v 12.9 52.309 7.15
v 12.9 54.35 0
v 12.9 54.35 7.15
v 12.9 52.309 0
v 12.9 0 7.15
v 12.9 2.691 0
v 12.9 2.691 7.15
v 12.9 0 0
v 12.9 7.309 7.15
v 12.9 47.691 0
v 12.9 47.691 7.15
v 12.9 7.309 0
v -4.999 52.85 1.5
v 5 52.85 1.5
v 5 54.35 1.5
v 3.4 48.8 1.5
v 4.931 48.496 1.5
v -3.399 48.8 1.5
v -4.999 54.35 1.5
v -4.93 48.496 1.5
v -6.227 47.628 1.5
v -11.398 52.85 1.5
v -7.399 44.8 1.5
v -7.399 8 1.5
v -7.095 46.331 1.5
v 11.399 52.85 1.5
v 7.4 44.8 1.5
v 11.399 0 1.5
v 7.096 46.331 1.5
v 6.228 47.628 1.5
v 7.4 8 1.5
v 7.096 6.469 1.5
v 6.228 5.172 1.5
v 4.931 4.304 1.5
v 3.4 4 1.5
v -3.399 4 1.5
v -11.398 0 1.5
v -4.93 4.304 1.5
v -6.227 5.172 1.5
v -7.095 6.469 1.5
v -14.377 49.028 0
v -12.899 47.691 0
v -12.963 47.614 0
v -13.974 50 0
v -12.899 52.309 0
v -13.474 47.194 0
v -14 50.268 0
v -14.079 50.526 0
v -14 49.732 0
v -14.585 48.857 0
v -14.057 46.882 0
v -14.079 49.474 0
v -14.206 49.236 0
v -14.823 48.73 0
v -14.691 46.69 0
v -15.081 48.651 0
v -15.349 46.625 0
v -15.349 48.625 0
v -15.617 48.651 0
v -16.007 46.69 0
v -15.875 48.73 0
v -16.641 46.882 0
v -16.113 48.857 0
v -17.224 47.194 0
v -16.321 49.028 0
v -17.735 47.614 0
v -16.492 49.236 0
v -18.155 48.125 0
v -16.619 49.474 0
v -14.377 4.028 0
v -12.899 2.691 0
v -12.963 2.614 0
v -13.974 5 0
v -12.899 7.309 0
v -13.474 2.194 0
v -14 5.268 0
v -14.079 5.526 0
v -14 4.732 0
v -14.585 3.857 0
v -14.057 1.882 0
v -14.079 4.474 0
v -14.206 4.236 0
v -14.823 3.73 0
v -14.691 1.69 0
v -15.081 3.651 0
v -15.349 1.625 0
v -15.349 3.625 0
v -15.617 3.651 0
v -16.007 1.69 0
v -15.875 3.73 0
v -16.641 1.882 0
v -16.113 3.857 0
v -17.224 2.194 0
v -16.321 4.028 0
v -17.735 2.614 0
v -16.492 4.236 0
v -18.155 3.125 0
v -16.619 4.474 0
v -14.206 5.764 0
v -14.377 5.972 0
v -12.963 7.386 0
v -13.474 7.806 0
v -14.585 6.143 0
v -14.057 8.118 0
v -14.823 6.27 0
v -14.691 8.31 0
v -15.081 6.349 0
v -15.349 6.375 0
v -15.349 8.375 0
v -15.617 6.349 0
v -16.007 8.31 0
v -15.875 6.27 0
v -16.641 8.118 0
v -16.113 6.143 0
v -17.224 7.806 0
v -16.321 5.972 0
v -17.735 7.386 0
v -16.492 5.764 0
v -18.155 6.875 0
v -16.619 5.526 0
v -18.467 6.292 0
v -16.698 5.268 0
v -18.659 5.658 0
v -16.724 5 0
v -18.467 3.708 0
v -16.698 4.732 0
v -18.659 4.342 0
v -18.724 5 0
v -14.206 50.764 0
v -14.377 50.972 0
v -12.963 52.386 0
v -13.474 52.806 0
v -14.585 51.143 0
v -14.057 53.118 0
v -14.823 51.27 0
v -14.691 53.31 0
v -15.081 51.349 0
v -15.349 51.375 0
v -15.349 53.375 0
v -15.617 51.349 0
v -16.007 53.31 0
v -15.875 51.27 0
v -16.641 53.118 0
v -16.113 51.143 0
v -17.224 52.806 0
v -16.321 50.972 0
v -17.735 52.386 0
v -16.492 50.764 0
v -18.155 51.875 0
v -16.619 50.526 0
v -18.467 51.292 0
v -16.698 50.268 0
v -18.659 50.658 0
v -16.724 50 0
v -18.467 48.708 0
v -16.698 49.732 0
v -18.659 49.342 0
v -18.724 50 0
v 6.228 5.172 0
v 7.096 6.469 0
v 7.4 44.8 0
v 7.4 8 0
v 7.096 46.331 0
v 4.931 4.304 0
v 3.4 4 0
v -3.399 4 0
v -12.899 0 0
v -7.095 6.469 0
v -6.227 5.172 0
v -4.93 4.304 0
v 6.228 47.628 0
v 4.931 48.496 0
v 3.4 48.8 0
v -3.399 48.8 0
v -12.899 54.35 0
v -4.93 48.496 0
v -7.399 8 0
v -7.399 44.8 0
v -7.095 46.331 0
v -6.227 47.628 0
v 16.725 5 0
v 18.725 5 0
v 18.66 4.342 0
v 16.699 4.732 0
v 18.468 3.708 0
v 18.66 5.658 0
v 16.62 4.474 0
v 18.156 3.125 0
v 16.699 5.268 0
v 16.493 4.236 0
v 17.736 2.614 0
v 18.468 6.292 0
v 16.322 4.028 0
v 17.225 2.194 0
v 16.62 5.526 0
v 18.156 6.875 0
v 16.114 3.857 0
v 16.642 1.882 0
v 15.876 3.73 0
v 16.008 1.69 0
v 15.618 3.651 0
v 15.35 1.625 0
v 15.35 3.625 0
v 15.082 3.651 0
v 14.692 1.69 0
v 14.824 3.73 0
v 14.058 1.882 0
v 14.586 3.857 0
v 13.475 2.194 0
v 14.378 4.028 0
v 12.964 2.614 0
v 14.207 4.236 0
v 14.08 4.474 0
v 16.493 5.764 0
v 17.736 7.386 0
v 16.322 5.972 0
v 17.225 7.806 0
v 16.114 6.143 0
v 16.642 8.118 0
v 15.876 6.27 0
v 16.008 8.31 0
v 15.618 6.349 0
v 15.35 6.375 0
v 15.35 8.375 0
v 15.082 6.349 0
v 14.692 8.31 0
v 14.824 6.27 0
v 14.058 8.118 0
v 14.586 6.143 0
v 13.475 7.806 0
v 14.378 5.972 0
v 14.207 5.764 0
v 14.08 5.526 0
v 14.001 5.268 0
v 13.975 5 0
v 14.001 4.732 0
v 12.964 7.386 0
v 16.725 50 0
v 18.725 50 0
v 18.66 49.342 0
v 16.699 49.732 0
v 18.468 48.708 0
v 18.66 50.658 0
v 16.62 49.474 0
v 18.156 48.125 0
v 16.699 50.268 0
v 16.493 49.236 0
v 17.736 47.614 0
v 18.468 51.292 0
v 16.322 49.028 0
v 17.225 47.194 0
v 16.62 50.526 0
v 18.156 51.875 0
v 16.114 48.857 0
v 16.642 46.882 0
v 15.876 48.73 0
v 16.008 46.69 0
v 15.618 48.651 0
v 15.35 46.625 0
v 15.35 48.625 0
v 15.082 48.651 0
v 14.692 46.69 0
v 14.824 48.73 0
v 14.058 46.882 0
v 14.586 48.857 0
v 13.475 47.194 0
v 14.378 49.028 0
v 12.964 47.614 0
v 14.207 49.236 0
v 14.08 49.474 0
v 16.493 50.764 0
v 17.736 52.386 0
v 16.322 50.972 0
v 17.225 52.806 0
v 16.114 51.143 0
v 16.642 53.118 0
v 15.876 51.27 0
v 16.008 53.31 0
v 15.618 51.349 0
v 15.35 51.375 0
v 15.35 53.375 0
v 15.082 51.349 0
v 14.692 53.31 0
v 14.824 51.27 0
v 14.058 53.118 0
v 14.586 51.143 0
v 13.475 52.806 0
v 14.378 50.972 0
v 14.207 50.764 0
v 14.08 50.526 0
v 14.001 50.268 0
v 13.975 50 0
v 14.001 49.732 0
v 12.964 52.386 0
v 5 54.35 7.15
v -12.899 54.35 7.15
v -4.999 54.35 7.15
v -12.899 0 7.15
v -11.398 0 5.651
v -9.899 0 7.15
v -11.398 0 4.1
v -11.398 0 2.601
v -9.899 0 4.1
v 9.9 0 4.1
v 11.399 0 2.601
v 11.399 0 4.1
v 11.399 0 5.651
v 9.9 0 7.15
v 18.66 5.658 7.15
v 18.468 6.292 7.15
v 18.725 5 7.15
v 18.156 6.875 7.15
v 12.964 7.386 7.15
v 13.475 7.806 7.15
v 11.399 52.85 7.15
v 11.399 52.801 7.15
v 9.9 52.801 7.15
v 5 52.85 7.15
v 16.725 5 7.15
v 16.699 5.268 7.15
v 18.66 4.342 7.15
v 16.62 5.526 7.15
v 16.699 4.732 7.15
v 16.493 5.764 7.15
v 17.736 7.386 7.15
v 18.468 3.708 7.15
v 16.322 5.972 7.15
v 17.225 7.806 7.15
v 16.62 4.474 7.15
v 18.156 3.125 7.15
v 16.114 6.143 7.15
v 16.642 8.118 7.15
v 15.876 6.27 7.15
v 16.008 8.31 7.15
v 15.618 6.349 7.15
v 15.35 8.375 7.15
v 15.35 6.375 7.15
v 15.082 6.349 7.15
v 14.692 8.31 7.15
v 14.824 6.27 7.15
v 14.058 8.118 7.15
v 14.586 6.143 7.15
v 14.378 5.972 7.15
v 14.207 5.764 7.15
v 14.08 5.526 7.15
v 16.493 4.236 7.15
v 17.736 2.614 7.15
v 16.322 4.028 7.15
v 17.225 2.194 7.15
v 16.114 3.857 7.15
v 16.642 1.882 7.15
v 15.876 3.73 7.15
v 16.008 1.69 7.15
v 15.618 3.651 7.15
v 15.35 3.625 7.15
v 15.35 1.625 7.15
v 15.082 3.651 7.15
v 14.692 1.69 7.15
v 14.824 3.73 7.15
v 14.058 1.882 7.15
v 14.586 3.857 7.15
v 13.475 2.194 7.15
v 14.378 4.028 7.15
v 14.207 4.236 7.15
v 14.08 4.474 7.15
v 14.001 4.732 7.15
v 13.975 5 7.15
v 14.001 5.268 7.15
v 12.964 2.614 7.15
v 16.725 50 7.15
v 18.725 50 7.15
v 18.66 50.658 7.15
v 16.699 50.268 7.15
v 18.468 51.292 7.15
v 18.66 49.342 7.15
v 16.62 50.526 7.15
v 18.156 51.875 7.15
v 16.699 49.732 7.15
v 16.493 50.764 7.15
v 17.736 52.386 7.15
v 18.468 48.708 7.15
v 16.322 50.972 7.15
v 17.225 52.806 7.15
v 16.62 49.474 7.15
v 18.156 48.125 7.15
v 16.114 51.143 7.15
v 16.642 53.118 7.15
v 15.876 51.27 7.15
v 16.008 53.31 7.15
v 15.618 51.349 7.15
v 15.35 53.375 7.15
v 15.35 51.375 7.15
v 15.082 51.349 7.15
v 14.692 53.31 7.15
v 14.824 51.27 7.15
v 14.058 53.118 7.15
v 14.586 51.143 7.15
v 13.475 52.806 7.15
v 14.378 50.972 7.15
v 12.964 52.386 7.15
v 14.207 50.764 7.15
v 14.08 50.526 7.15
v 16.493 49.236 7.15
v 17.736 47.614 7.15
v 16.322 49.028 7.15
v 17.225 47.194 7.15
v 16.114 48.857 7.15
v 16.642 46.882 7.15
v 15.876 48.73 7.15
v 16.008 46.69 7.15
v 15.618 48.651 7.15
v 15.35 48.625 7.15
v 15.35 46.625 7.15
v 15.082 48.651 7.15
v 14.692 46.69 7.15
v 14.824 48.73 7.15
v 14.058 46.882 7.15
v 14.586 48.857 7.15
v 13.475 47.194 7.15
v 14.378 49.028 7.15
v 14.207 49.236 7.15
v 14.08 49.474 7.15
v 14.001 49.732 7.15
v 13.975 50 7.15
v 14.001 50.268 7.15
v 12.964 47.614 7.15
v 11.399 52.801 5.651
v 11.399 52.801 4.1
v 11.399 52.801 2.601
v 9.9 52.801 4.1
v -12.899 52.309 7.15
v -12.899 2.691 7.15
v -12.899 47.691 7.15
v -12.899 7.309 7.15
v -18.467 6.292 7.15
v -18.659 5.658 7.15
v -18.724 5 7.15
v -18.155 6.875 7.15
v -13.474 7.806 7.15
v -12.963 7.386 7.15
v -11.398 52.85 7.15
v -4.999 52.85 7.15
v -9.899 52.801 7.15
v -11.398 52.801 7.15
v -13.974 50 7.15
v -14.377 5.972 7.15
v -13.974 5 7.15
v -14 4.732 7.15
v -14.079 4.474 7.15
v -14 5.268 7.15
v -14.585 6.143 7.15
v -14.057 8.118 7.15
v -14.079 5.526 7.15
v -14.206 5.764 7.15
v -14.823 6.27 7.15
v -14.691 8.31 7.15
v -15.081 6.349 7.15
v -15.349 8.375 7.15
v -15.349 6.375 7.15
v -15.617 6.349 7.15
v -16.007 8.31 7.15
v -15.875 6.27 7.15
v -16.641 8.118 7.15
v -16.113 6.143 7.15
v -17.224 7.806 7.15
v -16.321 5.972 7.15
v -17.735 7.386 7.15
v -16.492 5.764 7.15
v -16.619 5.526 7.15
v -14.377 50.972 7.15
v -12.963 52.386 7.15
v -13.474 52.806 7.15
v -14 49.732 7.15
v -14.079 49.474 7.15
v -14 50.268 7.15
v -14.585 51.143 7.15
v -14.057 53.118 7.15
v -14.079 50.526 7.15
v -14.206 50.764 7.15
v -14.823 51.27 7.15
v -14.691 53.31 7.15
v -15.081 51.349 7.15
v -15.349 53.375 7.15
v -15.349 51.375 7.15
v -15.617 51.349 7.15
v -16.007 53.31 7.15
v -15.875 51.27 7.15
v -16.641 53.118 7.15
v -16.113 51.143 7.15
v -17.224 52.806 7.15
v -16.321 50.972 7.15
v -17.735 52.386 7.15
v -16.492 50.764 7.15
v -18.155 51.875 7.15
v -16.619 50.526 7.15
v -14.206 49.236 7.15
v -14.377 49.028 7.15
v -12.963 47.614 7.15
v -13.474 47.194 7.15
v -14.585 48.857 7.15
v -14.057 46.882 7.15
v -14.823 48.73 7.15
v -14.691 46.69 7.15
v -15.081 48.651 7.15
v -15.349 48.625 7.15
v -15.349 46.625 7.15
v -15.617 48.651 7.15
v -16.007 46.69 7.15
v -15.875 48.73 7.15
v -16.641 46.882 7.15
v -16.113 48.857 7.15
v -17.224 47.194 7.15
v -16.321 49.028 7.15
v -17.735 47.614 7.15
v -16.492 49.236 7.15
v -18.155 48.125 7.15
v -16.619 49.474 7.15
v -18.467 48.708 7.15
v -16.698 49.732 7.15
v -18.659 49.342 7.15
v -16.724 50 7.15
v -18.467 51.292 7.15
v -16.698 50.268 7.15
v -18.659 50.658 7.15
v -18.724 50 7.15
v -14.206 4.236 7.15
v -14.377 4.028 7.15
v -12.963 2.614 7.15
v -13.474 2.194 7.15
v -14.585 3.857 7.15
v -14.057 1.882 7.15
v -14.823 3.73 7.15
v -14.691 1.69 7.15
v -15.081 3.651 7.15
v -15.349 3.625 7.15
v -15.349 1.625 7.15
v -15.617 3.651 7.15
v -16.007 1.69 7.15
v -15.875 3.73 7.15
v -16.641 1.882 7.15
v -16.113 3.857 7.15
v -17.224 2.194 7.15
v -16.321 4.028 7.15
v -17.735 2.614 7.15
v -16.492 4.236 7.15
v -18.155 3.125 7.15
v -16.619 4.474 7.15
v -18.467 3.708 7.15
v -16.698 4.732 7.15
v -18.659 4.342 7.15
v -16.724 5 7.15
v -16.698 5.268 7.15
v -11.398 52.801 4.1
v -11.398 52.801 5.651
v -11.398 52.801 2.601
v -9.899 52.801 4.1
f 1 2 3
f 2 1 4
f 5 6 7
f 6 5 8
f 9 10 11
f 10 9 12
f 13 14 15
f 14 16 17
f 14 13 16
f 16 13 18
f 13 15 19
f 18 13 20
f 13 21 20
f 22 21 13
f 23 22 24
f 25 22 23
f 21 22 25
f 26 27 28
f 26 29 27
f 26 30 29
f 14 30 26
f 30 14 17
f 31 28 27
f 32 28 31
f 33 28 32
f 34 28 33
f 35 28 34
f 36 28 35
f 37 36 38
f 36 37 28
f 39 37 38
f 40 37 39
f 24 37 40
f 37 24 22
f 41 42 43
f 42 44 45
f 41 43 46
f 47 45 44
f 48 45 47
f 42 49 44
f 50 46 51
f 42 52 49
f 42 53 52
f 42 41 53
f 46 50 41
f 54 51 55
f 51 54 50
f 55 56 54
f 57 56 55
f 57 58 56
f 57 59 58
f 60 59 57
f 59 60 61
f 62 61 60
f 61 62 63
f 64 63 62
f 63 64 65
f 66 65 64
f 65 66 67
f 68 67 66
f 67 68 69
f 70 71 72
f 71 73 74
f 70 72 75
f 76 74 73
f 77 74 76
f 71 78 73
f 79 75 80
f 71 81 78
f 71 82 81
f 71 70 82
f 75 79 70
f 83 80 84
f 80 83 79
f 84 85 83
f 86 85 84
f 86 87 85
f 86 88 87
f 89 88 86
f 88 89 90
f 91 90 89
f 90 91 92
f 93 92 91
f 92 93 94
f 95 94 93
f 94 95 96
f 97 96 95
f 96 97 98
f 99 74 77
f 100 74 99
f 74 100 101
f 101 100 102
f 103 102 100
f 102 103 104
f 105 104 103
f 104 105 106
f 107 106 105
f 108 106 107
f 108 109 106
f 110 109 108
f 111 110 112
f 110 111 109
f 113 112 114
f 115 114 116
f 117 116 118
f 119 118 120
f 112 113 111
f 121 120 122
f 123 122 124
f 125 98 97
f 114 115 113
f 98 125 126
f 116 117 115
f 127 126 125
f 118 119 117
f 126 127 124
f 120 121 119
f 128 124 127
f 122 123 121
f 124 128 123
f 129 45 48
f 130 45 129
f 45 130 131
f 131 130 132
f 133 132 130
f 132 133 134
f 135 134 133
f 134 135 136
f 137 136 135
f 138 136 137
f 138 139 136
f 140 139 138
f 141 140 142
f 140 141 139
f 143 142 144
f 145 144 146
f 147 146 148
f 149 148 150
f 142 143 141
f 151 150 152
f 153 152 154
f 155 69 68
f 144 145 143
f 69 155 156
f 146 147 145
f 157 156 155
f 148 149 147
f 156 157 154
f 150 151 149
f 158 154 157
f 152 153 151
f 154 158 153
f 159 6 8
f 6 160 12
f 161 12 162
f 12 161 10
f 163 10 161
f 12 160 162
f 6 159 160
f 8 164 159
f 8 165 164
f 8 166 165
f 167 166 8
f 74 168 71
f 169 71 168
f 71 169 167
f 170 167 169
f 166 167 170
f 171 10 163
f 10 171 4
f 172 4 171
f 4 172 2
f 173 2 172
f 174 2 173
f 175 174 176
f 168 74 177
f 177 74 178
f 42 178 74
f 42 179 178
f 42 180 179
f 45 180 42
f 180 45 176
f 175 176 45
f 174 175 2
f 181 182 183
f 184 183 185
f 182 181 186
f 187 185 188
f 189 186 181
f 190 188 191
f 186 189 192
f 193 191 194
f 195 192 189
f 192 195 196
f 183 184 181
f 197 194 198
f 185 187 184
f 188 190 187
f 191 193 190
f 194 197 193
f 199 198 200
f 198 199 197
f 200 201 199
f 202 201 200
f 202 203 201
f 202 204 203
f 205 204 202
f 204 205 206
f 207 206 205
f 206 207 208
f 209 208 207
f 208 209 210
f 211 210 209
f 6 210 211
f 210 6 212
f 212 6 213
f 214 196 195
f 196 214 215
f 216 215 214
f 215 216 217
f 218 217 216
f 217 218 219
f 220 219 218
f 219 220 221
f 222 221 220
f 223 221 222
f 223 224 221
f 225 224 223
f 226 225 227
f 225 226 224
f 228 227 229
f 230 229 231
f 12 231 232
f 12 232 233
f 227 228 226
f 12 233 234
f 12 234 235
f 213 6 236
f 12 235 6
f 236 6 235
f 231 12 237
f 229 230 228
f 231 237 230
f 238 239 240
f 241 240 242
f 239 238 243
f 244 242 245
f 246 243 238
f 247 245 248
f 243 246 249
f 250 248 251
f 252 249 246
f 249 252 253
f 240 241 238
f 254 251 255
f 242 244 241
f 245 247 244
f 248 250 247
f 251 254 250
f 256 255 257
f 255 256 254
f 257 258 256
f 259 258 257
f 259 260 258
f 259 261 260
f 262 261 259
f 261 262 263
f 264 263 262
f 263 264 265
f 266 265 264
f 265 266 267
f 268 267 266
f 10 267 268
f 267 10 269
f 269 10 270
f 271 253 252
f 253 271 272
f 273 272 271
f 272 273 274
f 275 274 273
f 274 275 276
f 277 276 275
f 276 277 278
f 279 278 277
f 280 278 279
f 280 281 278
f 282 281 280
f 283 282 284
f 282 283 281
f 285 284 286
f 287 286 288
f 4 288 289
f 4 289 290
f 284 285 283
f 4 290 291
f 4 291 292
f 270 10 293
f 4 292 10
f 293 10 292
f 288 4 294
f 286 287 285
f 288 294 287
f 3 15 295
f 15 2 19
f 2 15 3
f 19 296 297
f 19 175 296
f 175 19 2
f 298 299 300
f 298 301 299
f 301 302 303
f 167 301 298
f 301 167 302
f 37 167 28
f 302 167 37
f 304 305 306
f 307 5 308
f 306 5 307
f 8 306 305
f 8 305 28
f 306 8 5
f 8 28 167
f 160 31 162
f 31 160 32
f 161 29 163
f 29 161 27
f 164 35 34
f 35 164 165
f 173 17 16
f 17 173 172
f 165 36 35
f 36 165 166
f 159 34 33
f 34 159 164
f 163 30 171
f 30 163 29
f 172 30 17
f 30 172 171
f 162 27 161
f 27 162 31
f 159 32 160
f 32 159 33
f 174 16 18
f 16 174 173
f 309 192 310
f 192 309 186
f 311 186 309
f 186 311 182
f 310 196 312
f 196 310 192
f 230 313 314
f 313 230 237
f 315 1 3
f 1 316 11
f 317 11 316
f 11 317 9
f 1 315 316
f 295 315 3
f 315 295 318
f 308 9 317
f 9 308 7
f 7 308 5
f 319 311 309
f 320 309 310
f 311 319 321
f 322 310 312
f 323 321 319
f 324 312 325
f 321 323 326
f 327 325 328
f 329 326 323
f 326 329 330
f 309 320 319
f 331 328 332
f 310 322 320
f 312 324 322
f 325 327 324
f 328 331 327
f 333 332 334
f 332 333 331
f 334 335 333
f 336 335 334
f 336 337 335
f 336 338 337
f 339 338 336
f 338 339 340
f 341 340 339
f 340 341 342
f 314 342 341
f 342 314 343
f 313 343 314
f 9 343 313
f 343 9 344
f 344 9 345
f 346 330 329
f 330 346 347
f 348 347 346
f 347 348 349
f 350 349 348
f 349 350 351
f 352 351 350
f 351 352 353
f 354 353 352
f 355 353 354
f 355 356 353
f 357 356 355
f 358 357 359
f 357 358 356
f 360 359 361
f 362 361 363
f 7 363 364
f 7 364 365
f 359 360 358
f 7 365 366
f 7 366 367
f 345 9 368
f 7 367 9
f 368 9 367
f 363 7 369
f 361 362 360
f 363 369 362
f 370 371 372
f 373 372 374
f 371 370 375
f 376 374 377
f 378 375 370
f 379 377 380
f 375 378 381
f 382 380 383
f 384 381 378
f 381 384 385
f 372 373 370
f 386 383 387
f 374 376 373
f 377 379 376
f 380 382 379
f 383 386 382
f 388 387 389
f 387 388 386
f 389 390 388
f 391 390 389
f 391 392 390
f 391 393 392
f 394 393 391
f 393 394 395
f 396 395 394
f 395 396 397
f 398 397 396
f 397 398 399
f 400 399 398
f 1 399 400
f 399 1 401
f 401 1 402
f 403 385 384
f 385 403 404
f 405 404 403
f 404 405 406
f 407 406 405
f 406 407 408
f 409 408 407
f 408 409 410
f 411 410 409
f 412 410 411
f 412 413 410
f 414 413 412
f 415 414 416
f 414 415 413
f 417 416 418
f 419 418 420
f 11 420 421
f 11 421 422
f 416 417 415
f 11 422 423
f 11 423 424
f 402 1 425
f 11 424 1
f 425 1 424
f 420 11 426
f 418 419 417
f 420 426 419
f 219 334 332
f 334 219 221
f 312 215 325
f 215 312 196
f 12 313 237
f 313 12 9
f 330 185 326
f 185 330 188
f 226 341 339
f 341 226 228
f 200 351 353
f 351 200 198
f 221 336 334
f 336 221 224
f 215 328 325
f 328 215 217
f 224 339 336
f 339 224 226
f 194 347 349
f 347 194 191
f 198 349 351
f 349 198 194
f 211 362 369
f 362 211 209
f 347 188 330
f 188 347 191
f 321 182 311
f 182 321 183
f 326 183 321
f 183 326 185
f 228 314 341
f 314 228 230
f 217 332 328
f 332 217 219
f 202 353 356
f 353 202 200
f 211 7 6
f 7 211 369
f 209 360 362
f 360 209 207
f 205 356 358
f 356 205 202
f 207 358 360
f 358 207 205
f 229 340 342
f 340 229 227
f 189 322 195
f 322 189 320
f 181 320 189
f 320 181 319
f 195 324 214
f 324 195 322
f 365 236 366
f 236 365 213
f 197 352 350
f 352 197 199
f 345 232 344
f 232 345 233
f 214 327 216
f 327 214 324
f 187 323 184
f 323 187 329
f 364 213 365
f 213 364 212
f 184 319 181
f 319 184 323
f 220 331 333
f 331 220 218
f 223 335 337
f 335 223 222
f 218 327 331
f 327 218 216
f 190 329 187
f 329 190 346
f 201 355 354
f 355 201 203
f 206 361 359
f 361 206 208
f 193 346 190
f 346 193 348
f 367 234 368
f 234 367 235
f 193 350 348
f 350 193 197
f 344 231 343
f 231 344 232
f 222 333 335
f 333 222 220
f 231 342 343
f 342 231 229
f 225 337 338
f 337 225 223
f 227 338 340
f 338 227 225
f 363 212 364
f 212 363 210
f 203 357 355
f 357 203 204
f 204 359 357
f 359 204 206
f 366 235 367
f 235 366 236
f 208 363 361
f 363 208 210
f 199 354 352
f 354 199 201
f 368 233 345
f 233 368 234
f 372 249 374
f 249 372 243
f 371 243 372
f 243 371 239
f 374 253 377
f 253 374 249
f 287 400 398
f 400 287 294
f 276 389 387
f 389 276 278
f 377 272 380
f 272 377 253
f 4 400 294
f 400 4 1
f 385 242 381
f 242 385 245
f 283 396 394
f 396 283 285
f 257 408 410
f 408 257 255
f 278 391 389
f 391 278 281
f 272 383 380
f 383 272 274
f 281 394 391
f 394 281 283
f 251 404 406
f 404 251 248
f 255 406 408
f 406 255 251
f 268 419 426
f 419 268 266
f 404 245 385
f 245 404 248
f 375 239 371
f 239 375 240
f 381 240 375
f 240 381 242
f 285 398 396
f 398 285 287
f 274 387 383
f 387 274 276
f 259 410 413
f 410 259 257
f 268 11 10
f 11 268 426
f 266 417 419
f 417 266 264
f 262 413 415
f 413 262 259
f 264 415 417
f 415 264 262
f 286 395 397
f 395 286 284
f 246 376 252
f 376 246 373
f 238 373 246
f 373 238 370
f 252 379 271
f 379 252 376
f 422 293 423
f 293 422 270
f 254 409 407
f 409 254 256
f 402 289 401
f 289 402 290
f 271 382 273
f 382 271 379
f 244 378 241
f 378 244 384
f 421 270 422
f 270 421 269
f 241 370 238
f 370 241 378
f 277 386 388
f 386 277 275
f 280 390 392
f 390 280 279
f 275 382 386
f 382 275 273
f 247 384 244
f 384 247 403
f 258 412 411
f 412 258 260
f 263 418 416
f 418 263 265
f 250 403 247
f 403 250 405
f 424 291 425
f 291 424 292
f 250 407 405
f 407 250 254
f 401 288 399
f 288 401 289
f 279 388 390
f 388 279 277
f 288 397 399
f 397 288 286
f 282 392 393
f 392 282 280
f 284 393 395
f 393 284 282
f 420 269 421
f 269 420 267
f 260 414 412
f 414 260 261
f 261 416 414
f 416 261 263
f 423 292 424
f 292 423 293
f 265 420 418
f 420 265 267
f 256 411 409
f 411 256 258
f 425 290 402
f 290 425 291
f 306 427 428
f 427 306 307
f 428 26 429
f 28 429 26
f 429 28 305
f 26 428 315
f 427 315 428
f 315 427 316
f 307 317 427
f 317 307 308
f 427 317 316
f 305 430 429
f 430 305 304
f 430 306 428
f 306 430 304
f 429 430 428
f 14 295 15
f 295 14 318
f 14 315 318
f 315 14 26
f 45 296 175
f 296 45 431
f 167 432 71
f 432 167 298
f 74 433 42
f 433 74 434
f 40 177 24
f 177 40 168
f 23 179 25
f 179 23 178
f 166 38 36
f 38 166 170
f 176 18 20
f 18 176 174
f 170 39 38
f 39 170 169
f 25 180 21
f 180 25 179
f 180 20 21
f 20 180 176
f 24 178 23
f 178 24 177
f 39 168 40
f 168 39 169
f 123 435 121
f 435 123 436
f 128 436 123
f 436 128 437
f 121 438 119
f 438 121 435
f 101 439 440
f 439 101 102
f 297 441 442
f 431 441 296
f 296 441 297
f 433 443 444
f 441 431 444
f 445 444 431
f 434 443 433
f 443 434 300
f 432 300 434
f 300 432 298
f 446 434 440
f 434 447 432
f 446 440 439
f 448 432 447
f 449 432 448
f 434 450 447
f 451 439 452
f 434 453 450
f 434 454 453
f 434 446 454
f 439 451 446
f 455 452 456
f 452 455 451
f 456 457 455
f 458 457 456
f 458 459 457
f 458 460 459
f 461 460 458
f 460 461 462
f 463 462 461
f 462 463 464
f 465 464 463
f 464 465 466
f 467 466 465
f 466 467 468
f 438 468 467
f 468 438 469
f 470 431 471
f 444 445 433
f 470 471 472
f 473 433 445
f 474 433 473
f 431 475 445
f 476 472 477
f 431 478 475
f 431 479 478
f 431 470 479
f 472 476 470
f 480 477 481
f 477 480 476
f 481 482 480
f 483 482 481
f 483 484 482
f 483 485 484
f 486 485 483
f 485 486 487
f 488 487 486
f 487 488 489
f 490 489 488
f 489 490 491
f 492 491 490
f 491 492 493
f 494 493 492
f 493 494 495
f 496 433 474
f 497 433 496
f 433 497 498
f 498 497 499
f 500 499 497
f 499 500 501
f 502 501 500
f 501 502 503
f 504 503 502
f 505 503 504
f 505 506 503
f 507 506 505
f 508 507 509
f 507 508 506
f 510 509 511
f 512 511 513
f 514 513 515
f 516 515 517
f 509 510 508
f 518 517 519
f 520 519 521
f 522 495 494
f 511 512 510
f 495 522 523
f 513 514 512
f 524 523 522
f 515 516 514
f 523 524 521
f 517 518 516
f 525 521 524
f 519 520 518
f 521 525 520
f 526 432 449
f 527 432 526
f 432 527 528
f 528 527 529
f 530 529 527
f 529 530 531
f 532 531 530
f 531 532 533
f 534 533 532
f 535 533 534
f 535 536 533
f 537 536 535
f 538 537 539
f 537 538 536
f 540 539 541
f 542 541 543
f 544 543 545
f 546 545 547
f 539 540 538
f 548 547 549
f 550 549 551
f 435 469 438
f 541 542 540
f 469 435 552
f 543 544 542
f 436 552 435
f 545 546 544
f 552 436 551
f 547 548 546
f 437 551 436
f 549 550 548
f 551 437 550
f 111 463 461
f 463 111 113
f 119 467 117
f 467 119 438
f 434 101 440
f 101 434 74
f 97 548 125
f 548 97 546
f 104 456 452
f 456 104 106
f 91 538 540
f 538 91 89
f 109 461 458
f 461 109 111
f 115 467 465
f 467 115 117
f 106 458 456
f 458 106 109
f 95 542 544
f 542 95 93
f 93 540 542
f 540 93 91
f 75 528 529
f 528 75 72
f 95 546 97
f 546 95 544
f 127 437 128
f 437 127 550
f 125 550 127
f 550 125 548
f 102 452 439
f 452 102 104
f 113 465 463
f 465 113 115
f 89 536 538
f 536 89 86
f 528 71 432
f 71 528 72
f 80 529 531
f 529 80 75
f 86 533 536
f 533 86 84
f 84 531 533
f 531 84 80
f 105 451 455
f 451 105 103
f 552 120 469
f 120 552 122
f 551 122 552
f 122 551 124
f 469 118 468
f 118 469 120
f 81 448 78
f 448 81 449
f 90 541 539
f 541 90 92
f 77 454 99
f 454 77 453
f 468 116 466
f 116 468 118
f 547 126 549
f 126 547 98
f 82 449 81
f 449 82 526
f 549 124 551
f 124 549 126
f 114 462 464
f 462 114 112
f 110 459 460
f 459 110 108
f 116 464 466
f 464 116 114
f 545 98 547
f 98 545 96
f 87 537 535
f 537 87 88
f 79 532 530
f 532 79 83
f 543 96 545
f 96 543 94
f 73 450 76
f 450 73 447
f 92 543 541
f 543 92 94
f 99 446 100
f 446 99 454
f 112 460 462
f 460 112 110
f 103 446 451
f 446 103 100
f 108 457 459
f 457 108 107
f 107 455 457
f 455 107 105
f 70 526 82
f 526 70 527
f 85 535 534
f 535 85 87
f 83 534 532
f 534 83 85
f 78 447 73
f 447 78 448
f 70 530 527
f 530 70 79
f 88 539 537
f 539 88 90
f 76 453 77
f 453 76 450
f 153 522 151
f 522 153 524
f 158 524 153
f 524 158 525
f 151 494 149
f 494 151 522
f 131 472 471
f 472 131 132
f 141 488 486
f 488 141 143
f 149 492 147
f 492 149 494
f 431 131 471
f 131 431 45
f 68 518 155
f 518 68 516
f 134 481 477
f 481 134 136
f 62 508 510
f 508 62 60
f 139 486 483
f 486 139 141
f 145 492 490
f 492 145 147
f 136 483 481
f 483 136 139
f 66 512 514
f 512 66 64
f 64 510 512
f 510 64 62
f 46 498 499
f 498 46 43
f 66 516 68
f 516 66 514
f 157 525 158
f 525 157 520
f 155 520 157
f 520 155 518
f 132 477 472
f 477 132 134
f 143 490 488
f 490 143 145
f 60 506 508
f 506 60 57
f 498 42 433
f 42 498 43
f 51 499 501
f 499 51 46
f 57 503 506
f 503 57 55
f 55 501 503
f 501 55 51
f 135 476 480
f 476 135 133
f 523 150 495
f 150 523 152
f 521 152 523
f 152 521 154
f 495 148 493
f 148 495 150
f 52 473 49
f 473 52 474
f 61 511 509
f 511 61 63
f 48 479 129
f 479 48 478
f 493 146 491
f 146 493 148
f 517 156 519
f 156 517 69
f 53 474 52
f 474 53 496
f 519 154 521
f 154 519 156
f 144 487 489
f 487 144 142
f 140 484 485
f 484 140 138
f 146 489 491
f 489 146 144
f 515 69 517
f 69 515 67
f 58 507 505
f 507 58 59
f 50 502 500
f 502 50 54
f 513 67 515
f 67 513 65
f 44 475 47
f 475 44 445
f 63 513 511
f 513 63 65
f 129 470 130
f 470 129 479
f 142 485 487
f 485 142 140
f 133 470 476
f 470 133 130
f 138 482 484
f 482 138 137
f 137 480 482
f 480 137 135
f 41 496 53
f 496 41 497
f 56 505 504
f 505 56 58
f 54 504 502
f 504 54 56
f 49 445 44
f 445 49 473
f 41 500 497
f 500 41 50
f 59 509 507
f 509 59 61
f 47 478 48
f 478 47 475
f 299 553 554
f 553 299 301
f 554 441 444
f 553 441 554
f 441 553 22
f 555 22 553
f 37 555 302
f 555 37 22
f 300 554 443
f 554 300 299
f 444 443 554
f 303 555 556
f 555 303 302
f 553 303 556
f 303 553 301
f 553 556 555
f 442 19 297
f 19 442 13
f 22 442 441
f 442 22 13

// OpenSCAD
// This file was processed by resolve-include.py [https://github.com/arpruss/miscellaneous-scad/blob/master/scripts/resolve-include.py] 
// to include  all the dependencies inside one file.


//BEGIN DEPENDENCY: use <pointhull.scad>;
function _slice(list,start,end=undef) =
    let(end = end==undef?len(list):end)
    [for(i=[start:1:end-1]) list[i]];

function _delete(list,pos) =
    let(l=len(list))
    pos == 0 ? [for(i=[1:1:l-1]) list[i]] :
    pos >= l-1 ? [for(i=[0:1:pos-1]) list[i]] :
    concat([for(i=[0:1:pos-1]) list[i]],
        [for(i=[pos+1:1:l-1]) list[i]]);

function _areCollinear(a,b,c) = cross(b-a,c-a) == [0,0,0];

function _areCoplanar(a,b,c,d) = (d-a)*cross(b-a,c-a) == 0;

function _findNoncollinear(list,point1,point2,pos=0) =
    pos >= len(list) ? undef :
    ! _areCollinear(point1,point2,list[pos]) ? pos :
    _findNoncollinear(list,point1,point2,pos=pos+1);

function _findNoncoplanar(list,point1,point2,point3,pos=0) =
   pos >= len(list) ? undef :
   ! _areCoplanar(point1,point2,point3,list[pos]) ? pos :
        _findNoncoplanar(list,point1,point2,point3,pos=pos+1);

function _isBoundedBy(a,face,strict=false) =
    cross(face[1]-face[0],face[2]-face[0])*(a-face[0]);

function _makeTet(a,b,c,d) =
    _isBoundedBy(d,[a,b,c]) >= 0 ?
        [[a,b,c],[b,a,d],[c,b,d],[a,c,d]] :
        [[c,b,a],[d,a,b],[d,b,c],[d,c,a]];

function _findTri(list) =
    let(l2=_unique(list))
    assert(len(l2)>=3)
    let(a=l2[0],
        b=l2[1],
        l3=_slice(l2,2),
        ci=_findNoncollinear(l3,a,b),
        c=assert(ci != undef) l3[ci],
        l4=_delete(l3,ci))
        [[a,b,c],l4];

function _findTet(list) =
    let(ft=_findTri(list),
        tri=ft[0],
        l4=ft[1],
        di=assert(len(l4)>0) _findNoncoplanar(l4,tri[0],tri[1],tri[2]),
        d=assert(di != undef) l4[di],
        l5=_delete(l4,di))
        [_makeTet(tri[0],tri[1],tri[2],d),l5];

function _find(list,value) =
    let(m=search([value],list,1)[0])
    m==[] ? undef : m;

function _unique(list,soFar=[],pos=0) =
    pos >= len(list) ? soFar :
    _find(soFar,list[pos]) == undef ? _unique(list,soFar=concat(soFar,[list[pos]]),pos=pos+1) :
    _unique(list,soFar=soFar,pos=pos+1);

function _makePointsAndFaces(triangles) =
    let(points=_unique([for(t=triangles) for(v=t) v]))
        [points, [for(t=triangles) [for(v=t) _find(points,v)]]];

function _sameSide(p1,p2, a,b) =
    let(cp1 = cross(b-a, p1-a),
        cp2 = cross(b-a, p2-a))
        cp1*cp2 >= 0;

function _insideTriangle(p, t) =
    _sameSide(p,t[0],t[1],t[2]) &&
    _sameSide(p,t[1],t[0],t[2]) &&
    _sameSide(p,t[2],t[0],t[1]);


function _satisfiesConstraint(p, triangle) =
    let(c=_isBoundedBy(p, triangle))
    c > 0 || (c == 0 && _insideTriangle(p, triangle));


function _insidePoly(p, triangles, pos=0) =
    pos >= len(triangles) ? true :
    !_satisfiesConstraint(p, triangles[pos]) ? false :
    _insidePoly(p, triangles, pos=pos+1);

function _outerEdges(triangles) =
        let(edges=[for(t=triangles) for(e=[[t[0],t[1]],
                [t[1],t[2]],
                [t[2],t[0]]]) e])
        [for(e=edges) if(undef == _find(edges,[e[1],e[0]])) e];

function _unlit(triangles, p) = [for(t=triangles) if(_isBoundedBy(p, t) >= 0) t];

function _addToHull(h, p) =
    let(unlit = _unlit(h,p),
        edges = _outerEdges(unlit))
        concat(unlit, [for(e=edges) [e[1],e[0],p]]);

function _expandHull(h, points, pos=0) =
    pos >= len(points) ? h :
    !_insidePoly(points[pos],h) ?  _expandHull(_addToHull(h,points[pos]),points,pos=pos+1) :
    _expandHull(h, points, pos=pos+1);

function pointHull3D(points) =
    let(ft=_findTet(points))
        _expandHull(ft[0], ft[1]);

function _traceEdges(edgeStarts,edgeEnds,soFar=undef) =
    soFar==undef ? _traceEdges(edgeStarts,edgeEnds,[edgeStarts[0]]) :
    assert(soFar[len(soFar)-1] != undef)
    len(soFar)>1 && soFar[len(soFar)-1] == soFar[0] ? _slice(soFar,1) :
    _traceEdges(edgeStarts,edgeEnds,soFar=concat(soFar,[edgeEnds[_find(edgeStarts,soFar[len(soFar)-1])]]));

function _project(v) = [v[0],v[1]];

function pointHull2D(points) =
    let(
        p3d = concat([[0,0,1]],
            [for(p=points) [p[0],p[1],0]]),
        h = pointHull3D(p3d),
        edgeStarts = [for(t=h) if(t[0][2]==1 || t[1][2]==1 || t[2][2]==1)
                t[0][2]==1 ? _project(t[1]) :
                t[1][2]==1 ? _project(t[2]) :
                _project(t[0]) ],
        edgeEnds = [for(t=h) if(t[0][2]==1 || t[1][2]==1 || t[2][2]==1)
                t[0][2]==1 ? _project(t[2]) :
                t[1][2]==1 ? _project(t[0]) :
                _project(t[1]) ])
        _traceEdges(edgeStarts,edgeEnds,soFar=[edgeStarts[0]]);

function pointHull(points) =
    len(points[0]) == 2 ? pointHull2D(points) :
        pointHull3D(points);

module pointHull(points) {
    if (len(points[0])==2) {
        polygon(pointHull2D(points));
    }
    else {
        paf = _makePointsAndFaces(pointHull3D(points));
        polyhedron(points=paf[0],faces=paf[1]);
    }
}

function extractPointsFromHull(h) =
    _unique(
        is_num(h[0][0]) ? h : [for(t=h) for(v=t) v] );

function _d22(a00,a01,a10,a11) = a00*a11-a01*a10;

function _determinant3x3(m) = m[0][0]*_d22(m[1][1],m[1][2],m[2][1],m[2][2])
    -m[0][1]*_d22(m[1][0],m[1][2],m[2][0],m[2][2])
    +m[0][2]*_d22(m[1][0],m[1][1],m[2][0],m[2][1]);

function _determinant2x2(m) = _d22(m[0][0],m[0][1],m[1][0],m[1][1]);

// Cramer's rule
// n.b. Determinant of matrix is the same as of its transpose
function _solve3(a,b,c) =
    let(det=_determinant3x3([a[0],b[0],c[0]]))
    det == 0 ? undef :
    let(rhs=[a[1],b[1],c[1]],
        col0=[a[0][0],b[0][0],c[0][0]],
        col1=[a[0][1],b[0][1],c[0][1]],
        col2=[a[0][2],b[0][2],c[0][2]])
    [_determinant3x3([rhs,col1,col2]),
    _determinant3x3([col0,rhs,col2]),
    _determinant3x3([col0,col1,rhs])]/det;

function _solve2(a,b) =
    let(det=_determinant2x2([a[0],b[0]]))
    det == 0 ? undef :
    let(rhs=[a[1],b[1]],
        col0=[a[0][0],b[0][0]],
        col1=[a[0][1],b[0][1]])
    [_determinant2x2([rhs,col1]),
    _determinant2x2([col0,rhs])]/det;

function _satisfies(p,constraint) =
    p*constraint[0] <= constraint[1];

function _linearConstraintExtrema(constraints,constraintsMarked=false) =
        let(c=_unique(constraints),
            n=len(c))
        len(c[0][0]) == 3 ?
        [
        for(i=[0:1:n-1]) for(j=[i+1:1:n-1]) for(k=[j+1:1:n-1]) let(p=_solve3(c[i],c[j],c[k])) if(p!=undef && _satisfiesAll(p,c,except1=i,except2=j,except3=k)) constraintsMarked?[p,[i,j,k]]:p
        ] :
        [
        for(i=[0:1:n-1]) for(j=[i+1:1:n-1]) let(p=_solve2(c[i],c[j])) if(p!=undef && _satisfiesAll(p,c,except1=i,except2=j)) constraintsMarked?[p,[i,j,-1]]:p
        ];

function _satisfiesAll(p,c,except1=undef,except2=undef,except3=undef,pos=0) =
        pos >= len(c) ? true :
        except1 == pos || except2 == pos || except3 == pos || _satisfies(p,c[pos]) ? _satisfiesAll(p,c,except1,except2,except3,pos=pos+1) :
        false;


module linearConstraintShape(constraints) {
    pointHull(_linearConstraintExtrema(constraints));
}

// 3D inly
function _onPlane(v,planeIndex,data,pos=0) =
    pos >= len(data) ? false :
    data[pos][0] == v && (data[pos][1][0] == planeIndex || data[pos][1][1] == planeIndex || data[pos][1][2] == planeIndex) ? true :
    _onPlane(v,planeIndex,data,pos=pos+1);

// 3D only
function _getFaceOnPlane(planeIndex,triangles,data) =
    let(trianglesOnPlane = [for(t=triangles) if (_onPlane(t[0],planeIndex,data) &&
        _onPlane(t[1],planeIndex,data) &&
        _onPlane(t[2],planeIndex,data)) t],
        outer = _outerEdges(trianglesOnPlane),
        edgeStarts = [for(e=outer) e[0]],
        edgeEnds = [for(e=outer) e[1]]
    ) len(outer) == 0 ? undef : _traceEdges(edgeStarts,edgeEnds);

// 3D only, does not work if there are multiple planes defined by the same constraint
function linearConstraintPointsAndFaces(constraints) =
    let(data=_linearConstraintExtrema(constraints,constraintsMarked=true),
    extremePoints=[for(d=data) d[0]],

    triangles=pointHull(extremePoints),
    hullPoints=extractPointsFromHull(triangles),
    faces=[for (i=[0:len(constraints)-1]) [for(v=_getFaceOnPlane(i,triangles,data)) if(v != undef) _find(hullPoints,v)]]
    )
    [hullPoints,faces];

function hullPoints(points) =
    extractPointsFromHull(pointHull(points));

module dualHull(points) {
    p = hullPoints(points);
    constraints = [for(v=p) [v,v*v]];
    linearConstraintShape(constraints);
}


//END DEPENDENCY: use <pointhull.scad>;


//BEGIN DEPENDENCY: use <roundedSquare.scad>;
module roundedSquare(size=[10,10], radius=1, center=false, $fn=16) {
    size1 = !is_list(size) ? [size,size] : size;
    if (radius <= 0) {
        square(size1, center=center);
    }
    else {
        translate(center ? -size1/2 : [0,0])
        hull() {
            translate([radius,radius]) circle(r=radius);
            translate([size1[0]-radius,radius]) circle(r=radius);
            translate([size1[0]-radius,size1[1]-radius]) circle(r=radius);
            translate([radius,size1[1]-radius]) circle(r=radius);
        }
    }
}

module roundedCube(size=[10,10,10], radius=1, center=false, $fn=16) {
    linear_extrude(height=size[2])
    roundedSquare(size=[size[0],size[1]], radius=radius, center=center);
}

module roundedOpenTopBox(size=[10,10,10], radius=2, wall=1, solid=false) {
    render(convexity=2)
    difference() {
        linear_extrude(height=size[2]) roundedSquare(size=[size[0],size[1]], radius=radius);
        if (!solid) {
            translate([0,0,wall])
            linear_extrude(height=size[2]-wall)
            translate([wall,wall]) roundedSquare(size=[size[0]-2*wall,size[1]-2*wall], radius=radius-wall);
        }
    }
}

//END DEPENDENCY: use <roundedSquare.scad>;


// <params>
pcbThickness = 1.55;
pcbWidth = 22.7;
pcbLength = 52.8;
pcbOffsetFromBase = 2.6;
tolerance = 0.05;
wall = 1.5;
ridge = 1.5;
screwSize = 2.75;
screwHoleWall = 2;
screwButtressWall = 3;
screw1DistanceFromFront = 5;
screw2DistanceFromFront = 50;
screwDistanceFromPCB = 4;
rearHole = 10;
holeDistanceFromWall = 4;
// </params>

module pcbHolder(pcbThickness=pcbThickness, pcbWidth=pcbWidth, pcbLength=pcbLength, pcbOffsetFromBase=pcbOffsetFromBase, tolerance=tolerance, wall=wall, ridge=ridge, screwSize=screwSize, screwHoleWall=screwHoleWall, screwButtressWall=screwButtressWall, screw1DistanceFromFront=screw1DistanceFromFront,screw2DistanceFromFront=screw2DistanceFromFront,screwDistanceFromPCB=screwDistanceFromPCB,rearHole=rearHole,holeDistanceFromWall=holeDistanceFromWall) {
$fn = 32;

nudge = 0.001;

h = wall+pcbOffsetFromBase+pcbThickness+ridge;

echo("height", h);
echo("screwSpacing", screwDistanceFromPCB*2 + pcbWidth);

function getHeight() = h;
function getScrewSpacing() = screwDistanceFromPCB*2 + pcbWidth;
function getFrontScrewDistance() = screw1DistanceFromFront;
function getBackScrewDistance() = screw2DistanceFromFront;
function getPCBTopHeight() = wall+pcbOffsetFromBase+pcbThickness;
echo("pcbTopHeight",getPCBTopHeight());

module screw() {
    d = screwSize + screwHoleWall*2;
    translate([screwDistanceFromPCB+pcbWidth/2,0,0]) {
        difference() {
            union() {
            cylinder(d=d, h=h);
            translate([-screwDistanceFromPCB+tolerance,-screwButtressWall/2,0]) cube([screwDistanceFromPCB-tolerance,screwButtressWall,h]);
            }
            translate([0,0,-h]) cylinder(d=screwSize,h=3*h);
        }
    }
}

module half() {
    x = pcbWidth/2+tolerance;
    difference() {
    cube ([x+wall,pcbLength+wall+tolerance,wall]);
    translate([0,0,-wall])
    linear_extrude(height=wall*3)
    translate([-(x-holeDistanceFromWall),holeDistanceFromWall,0])
    roundedSquare([2*x-2*holeDistanceFromWall,pcbLength-2*holeDistanceFromWall],radius=holeDistanceFromWall);
    }
    translate([x-nudge,0,0]) cube([wall+nudge,pcbLength+wall+tolerance,h]);
    module vridge(h) {
    pointHull([[x,0,h-ridge],
        [x,0,h],[x-ridge,0,h],
        [x,pcbLength+nudge,h-ridge],
        [x,pcbLength+nudge,h],[x-ridge,pcbLength+nudge,h]]);
    }
    vridge(h);
    vridge(h-ridge-pcbThickness);
    translate([rearHole/2,pcbLength+tolerance,0])
    cube([x+wall-rearHole/2,wall,h]);
    translate([0,screw1DistanceFromFront,0])
    screw();
    translate([0,screw2DistanceFromFront,0])
    screw();
}

half();
translate([nudge,0,0]) mirror([1,0,0]) half();
}

pcbHolder();
